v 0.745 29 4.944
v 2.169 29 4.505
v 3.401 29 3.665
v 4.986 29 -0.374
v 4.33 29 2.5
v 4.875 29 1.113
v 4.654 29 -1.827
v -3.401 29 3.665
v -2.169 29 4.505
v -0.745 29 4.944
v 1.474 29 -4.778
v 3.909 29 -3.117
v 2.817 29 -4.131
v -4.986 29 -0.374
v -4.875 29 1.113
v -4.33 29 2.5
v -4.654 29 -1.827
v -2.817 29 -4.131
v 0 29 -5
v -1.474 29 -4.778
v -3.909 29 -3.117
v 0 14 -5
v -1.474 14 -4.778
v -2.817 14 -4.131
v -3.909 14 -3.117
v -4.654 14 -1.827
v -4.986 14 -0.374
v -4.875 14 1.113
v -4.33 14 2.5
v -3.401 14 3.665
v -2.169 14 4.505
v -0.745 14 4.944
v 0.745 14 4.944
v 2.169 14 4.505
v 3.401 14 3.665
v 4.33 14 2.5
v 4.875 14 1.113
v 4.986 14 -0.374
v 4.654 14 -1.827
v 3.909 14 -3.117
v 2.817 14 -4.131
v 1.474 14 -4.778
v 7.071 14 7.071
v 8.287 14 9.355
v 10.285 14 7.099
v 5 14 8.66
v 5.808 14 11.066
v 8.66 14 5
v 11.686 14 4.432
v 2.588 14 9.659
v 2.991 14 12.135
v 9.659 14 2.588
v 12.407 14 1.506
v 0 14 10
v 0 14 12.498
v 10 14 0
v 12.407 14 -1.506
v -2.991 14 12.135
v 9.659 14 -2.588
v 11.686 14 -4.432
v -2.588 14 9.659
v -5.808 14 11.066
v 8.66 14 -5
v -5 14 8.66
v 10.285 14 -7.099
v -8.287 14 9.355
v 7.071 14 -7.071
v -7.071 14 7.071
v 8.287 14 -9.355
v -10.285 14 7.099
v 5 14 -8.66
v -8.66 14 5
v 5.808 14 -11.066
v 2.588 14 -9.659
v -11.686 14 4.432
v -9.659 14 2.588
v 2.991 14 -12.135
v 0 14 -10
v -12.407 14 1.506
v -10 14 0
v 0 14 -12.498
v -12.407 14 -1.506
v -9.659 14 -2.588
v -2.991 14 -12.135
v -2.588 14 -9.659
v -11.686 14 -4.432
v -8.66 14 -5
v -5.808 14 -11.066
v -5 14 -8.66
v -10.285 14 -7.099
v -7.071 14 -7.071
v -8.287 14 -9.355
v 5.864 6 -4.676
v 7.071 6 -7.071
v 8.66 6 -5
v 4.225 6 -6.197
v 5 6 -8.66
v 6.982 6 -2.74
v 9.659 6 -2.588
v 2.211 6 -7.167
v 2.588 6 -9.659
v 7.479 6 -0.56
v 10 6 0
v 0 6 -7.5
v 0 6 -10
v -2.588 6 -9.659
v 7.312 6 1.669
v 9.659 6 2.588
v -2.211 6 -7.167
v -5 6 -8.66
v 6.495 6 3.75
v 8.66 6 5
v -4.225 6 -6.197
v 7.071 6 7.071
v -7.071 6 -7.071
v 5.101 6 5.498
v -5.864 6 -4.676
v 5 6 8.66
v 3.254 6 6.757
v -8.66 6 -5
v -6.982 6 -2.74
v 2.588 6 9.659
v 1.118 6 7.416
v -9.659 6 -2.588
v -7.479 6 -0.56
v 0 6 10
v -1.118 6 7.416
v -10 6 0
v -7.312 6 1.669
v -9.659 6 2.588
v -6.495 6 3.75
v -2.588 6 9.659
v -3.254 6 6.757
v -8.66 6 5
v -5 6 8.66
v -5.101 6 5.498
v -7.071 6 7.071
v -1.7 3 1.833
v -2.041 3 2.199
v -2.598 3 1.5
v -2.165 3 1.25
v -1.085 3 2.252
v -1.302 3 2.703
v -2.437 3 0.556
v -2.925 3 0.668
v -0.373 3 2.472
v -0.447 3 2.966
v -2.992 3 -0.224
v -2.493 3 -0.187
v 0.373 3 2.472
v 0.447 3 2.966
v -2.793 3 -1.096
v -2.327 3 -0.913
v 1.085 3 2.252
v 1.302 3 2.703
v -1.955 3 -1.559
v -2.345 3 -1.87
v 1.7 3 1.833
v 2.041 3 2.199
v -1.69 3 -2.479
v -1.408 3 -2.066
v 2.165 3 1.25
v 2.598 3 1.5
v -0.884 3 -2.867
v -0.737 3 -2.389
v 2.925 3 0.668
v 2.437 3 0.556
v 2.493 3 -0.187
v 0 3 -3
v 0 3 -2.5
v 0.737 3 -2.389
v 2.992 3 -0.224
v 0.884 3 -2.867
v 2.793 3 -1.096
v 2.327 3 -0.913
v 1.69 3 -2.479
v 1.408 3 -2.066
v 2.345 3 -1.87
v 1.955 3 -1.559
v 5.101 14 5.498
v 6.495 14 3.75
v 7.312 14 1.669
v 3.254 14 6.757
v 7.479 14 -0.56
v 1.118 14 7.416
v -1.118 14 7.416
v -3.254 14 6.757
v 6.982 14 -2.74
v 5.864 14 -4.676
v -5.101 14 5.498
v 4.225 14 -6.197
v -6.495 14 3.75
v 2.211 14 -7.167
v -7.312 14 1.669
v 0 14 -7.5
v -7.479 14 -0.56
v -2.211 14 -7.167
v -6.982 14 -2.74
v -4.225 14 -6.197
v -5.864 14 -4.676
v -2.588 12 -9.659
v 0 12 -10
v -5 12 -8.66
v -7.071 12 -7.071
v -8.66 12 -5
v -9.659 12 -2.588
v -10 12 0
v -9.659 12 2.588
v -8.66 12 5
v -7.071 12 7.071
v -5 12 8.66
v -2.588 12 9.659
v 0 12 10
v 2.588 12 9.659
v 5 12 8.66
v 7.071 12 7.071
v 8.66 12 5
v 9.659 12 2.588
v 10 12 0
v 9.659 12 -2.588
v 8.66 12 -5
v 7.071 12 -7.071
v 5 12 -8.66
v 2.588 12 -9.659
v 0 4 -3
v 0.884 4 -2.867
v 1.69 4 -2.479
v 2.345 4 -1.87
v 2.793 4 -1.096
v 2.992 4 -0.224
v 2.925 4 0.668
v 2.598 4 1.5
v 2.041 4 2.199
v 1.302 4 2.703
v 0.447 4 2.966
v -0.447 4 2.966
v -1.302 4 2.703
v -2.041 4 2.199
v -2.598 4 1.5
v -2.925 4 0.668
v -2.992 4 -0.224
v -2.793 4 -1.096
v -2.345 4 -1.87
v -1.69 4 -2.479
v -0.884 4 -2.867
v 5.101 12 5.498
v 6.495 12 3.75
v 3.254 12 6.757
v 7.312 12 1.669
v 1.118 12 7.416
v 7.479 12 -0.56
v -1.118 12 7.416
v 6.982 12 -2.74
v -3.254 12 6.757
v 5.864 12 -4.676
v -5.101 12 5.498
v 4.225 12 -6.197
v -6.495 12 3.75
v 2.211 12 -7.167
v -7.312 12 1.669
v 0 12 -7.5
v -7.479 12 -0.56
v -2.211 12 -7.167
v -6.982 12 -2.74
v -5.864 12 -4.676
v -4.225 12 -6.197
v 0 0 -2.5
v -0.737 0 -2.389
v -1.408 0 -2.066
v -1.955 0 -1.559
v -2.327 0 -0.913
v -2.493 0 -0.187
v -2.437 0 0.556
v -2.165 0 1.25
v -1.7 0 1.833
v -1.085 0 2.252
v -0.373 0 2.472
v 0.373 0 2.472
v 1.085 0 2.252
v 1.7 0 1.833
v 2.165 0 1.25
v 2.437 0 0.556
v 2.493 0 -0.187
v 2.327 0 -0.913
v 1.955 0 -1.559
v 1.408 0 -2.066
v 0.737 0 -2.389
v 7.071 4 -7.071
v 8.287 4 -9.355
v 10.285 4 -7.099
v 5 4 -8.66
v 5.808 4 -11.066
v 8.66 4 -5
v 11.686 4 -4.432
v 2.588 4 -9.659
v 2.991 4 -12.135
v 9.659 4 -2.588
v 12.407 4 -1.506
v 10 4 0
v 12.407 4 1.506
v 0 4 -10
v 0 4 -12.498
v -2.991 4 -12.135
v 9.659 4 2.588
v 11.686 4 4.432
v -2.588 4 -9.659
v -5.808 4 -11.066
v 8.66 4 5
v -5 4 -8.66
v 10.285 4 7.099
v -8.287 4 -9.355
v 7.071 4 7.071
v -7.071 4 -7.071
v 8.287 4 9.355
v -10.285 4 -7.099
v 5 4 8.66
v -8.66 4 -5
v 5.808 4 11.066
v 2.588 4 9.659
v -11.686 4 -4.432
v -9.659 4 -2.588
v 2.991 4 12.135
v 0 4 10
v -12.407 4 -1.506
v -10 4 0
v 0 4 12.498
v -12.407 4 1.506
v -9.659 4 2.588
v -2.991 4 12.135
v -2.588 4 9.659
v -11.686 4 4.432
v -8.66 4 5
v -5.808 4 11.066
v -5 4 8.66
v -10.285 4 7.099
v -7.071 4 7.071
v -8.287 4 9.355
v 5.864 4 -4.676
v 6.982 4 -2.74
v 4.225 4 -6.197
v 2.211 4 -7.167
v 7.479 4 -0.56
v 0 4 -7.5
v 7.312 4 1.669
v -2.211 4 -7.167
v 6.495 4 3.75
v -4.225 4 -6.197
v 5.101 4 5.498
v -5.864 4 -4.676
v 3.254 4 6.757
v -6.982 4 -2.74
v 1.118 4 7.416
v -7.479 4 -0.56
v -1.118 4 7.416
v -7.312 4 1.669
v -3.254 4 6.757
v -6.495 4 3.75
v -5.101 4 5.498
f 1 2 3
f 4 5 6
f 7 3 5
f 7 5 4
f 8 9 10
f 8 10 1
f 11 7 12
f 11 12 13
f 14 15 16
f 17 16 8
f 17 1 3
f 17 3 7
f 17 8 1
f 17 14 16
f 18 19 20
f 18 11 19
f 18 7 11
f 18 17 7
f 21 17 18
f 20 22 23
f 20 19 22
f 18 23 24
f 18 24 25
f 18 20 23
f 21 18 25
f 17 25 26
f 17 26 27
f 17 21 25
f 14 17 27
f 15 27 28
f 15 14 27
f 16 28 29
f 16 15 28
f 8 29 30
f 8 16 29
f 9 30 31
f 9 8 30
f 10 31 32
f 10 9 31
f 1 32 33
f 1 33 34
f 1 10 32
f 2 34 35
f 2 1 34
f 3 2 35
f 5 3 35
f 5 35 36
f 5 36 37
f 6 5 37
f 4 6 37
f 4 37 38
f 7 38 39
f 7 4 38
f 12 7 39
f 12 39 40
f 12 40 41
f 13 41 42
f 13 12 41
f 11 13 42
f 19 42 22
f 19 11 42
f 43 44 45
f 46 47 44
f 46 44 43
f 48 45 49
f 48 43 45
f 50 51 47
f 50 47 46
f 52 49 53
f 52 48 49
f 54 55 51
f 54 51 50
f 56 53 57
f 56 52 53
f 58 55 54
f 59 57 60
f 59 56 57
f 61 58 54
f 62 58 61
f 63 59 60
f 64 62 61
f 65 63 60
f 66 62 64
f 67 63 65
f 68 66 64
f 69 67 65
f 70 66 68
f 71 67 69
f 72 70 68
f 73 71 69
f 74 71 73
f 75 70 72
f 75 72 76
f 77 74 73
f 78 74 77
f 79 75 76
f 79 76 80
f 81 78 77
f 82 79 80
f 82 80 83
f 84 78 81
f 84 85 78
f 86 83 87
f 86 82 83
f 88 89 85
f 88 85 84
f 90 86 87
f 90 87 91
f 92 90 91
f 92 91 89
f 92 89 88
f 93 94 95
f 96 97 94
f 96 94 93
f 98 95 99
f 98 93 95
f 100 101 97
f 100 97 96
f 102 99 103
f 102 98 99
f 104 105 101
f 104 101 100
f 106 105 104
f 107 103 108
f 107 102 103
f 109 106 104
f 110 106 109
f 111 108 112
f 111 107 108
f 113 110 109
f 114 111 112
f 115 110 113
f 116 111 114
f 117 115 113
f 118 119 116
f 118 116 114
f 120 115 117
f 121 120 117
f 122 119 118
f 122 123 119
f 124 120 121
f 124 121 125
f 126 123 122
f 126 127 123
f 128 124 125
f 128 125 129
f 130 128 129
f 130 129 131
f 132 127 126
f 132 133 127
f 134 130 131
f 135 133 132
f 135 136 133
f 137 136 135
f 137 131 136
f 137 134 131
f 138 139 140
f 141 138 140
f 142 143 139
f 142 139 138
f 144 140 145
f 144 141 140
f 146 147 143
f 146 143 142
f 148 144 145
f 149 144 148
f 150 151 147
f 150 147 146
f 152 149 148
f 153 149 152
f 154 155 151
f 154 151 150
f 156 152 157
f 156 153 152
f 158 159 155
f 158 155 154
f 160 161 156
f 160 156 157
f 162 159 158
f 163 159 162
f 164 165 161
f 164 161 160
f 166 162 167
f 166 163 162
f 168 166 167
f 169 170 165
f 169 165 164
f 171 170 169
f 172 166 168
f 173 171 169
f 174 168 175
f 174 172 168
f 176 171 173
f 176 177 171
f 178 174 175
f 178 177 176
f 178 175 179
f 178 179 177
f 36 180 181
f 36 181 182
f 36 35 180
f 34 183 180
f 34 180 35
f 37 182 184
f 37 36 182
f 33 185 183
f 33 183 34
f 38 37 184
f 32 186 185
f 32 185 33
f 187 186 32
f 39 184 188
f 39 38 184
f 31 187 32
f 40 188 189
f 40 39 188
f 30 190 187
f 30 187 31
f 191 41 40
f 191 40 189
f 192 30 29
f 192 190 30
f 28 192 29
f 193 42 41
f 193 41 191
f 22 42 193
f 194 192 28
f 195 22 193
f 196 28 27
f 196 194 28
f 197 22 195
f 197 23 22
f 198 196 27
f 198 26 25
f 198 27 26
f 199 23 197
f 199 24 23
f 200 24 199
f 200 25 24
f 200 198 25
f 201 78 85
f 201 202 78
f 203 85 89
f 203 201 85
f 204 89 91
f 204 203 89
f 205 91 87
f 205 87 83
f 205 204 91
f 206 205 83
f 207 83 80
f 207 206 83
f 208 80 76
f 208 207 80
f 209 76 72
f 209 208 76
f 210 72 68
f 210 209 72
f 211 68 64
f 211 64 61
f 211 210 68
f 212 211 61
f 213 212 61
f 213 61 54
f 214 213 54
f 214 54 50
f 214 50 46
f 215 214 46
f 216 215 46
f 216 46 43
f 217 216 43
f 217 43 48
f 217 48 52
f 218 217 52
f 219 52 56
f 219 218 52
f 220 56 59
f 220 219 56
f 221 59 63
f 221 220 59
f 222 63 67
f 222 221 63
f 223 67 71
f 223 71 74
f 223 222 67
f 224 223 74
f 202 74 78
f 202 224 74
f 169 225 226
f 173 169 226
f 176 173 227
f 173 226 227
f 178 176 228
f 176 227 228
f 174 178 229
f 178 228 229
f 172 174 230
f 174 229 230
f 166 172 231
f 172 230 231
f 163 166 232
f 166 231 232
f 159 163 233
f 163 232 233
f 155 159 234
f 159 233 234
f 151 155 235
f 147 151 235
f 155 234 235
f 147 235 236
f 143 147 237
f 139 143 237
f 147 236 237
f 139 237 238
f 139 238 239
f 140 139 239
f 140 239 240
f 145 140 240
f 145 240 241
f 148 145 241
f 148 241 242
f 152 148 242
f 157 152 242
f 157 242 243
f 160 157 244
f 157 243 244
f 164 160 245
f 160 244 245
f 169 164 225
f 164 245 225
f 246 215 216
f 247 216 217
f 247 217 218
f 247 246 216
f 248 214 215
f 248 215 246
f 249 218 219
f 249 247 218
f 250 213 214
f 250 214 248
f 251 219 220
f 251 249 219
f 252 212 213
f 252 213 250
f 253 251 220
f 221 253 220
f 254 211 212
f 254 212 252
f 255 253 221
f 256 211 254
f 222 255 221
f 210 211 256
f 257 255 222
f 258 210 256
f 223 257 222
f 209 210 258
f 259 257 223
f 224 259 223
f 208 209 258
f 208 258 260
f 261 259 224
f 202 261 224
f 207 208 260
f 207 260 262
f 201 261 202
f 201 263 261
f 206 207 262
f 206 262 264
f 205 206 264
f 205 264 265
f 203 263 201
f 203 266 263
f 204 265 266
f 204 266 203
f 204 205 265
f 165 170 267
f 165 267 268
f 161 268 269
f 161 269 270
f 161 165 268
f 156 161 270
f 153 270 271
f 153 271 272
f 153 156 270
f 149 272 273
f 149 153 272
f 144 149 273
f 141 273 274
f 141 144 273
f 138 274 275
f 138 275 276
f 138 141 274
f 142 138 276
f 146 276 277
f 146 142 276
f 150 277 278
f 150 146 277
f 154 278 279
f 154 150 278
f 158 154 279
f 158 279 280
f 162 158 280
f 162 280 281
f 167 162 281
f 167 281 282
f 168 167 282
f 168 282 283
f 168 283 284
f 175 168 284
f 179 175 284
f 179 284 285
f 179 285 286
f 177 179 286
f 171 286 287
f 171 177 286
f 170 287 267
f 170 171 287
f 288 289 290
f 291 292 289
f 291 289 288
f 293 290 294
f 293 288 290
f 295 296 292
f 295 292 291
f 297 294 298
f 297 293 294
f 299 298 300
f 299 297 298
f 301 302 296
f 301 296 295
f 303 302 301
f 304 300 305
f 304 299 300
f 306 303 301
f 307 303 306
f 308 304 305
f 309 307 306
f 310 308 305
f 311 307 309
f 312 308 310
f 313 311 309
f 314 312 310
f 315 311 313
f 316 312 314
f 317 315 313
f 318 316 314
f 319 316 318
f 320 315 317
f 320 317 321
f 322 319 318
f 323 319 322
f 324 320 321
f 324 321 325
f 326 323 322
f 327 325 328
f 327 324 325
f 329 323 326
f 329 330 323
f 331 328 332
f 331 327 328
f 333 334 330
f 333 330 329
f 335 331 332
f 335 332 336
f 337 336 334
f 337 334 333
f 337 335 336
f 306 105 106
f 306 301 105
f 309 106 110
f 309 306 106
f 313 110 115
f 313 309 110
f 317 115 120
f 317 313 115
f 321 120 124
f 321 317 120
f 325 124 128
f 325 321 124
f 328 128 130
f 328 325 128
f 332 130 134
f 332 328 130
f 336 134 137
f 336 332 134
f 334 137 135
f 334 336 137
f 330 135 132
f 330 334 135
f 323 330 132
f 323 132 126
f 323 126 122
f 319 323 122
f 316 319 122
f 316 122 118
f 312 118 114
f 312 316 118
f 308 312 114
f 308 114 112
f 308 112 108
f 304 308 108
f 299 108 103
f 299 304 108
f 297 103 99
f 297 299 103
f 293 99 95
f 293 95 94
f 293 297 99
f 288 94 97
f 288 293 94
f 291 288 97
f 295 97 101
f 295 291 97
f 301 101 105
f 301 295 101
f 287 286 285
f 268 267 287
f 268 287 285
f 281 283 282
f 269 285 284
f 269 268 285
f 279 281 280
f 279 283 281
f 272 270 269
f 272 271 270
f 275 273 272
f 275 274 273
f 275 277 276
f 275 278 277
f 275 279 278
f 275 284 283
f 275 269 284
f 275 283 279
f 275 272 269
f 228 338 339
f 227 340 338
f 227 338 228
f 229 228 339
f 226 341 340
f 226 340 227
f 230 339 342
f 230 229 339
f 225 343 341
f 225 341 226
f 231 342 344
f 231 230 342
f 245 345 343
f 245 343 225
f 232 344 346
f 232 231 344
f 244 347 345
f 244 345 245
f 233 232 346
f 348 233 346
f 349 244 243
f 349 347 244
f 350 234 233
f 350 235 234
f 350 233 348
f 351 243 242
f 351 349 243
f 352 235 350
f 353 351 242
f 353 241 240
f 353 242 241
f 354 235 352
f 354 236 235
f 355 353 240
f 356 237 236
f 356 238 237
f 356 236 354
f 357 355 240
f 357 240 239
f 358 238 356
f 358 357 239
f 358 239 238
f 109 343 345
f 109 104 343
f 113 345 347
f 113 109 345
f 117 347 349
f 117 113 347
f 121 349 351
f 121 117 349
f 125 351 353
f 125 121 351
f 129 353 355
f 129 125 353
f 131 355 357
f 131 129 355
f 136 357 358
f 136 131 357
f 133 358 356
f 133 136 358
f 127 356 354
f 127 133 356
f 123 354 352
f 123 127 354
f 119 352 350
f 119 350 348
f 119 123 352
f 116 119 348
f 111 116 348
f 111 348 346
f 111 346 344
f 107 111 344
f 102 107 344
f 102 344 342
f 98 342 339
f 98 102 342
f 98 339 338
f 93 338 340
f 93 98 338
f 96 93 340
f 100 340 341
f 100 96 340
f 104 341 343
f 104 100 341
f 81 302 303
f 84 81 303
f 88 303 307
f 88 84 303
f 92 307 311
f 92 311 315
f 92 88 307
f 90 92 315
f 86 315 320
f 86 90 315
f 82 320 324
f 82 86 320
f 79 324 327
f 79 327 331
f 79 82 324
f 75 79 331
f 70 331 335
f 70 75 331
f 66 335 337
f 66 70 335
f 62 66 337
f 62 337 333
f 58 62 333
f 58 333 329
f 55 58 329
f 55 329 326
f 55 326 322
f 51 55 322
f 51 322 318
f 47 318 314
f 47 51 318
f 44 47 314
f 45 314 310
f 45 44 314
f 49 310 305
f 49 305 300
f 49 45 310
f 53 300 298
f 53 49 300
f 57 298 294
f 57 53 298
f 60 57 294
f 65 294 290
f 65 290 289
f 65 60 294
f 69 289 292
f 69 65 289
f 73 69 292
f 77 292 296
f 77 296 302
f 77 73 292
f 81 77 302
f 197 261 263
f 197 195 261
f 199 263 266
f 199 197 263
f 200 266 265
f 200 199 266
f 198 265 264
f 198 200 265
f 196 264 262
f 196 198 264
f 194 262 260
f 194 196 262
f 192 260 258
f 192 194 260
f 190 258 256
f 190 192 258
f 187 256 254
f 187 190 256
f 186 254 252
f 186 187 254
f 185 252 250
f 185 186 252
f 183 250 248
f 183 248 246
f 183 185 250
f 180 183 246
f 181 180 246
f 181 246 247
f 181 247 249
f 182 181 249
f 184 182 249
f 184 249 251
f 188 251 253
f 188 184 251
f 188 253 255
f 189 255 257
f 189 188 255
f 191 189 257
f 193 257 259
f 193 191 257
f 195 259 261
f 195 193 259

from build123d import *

# Parameters (mm, degrees)
SKETCH2_R           = 3
BOSS_EXTRUDE1_DEPTH = 1


with BuildPart() as part:
    # Sketch1 → Revolve1 (revolve)
    with BuildSketch(Plane.XY, mode=Mode.PRIVATE) as revolve1_sk:
        Polygon((0, 0), (2.5, 0), (2.5, 4), (7.5, 4), (7.5, 6), (10, 6), (10, 4), (12.497669608, 4), (12.497669608, 14), (10, 14), (10, 12), (7.5, 12), (7.5, 14), (5, 14), (5, 29), (0, 29), align=None)
    revolve(revolve1_sk.sketch.rotate(Axis((0, 0, 0), (0, 1, 0)), 90), axis=Axis((0, 0, 0), (0, 1, 0)))

    # Sketch2 → Boss-Extrude1 (add)
    with BuildSketch(Plane.XZ.offset(-4)):
        with Locations(Location((0, 0, 0), (0, 0, 270))):
            Circle(SKETCH2_R)
    extrude(amount=BOSS_EXTRUDE1_DEPTH)


solid = part.part
